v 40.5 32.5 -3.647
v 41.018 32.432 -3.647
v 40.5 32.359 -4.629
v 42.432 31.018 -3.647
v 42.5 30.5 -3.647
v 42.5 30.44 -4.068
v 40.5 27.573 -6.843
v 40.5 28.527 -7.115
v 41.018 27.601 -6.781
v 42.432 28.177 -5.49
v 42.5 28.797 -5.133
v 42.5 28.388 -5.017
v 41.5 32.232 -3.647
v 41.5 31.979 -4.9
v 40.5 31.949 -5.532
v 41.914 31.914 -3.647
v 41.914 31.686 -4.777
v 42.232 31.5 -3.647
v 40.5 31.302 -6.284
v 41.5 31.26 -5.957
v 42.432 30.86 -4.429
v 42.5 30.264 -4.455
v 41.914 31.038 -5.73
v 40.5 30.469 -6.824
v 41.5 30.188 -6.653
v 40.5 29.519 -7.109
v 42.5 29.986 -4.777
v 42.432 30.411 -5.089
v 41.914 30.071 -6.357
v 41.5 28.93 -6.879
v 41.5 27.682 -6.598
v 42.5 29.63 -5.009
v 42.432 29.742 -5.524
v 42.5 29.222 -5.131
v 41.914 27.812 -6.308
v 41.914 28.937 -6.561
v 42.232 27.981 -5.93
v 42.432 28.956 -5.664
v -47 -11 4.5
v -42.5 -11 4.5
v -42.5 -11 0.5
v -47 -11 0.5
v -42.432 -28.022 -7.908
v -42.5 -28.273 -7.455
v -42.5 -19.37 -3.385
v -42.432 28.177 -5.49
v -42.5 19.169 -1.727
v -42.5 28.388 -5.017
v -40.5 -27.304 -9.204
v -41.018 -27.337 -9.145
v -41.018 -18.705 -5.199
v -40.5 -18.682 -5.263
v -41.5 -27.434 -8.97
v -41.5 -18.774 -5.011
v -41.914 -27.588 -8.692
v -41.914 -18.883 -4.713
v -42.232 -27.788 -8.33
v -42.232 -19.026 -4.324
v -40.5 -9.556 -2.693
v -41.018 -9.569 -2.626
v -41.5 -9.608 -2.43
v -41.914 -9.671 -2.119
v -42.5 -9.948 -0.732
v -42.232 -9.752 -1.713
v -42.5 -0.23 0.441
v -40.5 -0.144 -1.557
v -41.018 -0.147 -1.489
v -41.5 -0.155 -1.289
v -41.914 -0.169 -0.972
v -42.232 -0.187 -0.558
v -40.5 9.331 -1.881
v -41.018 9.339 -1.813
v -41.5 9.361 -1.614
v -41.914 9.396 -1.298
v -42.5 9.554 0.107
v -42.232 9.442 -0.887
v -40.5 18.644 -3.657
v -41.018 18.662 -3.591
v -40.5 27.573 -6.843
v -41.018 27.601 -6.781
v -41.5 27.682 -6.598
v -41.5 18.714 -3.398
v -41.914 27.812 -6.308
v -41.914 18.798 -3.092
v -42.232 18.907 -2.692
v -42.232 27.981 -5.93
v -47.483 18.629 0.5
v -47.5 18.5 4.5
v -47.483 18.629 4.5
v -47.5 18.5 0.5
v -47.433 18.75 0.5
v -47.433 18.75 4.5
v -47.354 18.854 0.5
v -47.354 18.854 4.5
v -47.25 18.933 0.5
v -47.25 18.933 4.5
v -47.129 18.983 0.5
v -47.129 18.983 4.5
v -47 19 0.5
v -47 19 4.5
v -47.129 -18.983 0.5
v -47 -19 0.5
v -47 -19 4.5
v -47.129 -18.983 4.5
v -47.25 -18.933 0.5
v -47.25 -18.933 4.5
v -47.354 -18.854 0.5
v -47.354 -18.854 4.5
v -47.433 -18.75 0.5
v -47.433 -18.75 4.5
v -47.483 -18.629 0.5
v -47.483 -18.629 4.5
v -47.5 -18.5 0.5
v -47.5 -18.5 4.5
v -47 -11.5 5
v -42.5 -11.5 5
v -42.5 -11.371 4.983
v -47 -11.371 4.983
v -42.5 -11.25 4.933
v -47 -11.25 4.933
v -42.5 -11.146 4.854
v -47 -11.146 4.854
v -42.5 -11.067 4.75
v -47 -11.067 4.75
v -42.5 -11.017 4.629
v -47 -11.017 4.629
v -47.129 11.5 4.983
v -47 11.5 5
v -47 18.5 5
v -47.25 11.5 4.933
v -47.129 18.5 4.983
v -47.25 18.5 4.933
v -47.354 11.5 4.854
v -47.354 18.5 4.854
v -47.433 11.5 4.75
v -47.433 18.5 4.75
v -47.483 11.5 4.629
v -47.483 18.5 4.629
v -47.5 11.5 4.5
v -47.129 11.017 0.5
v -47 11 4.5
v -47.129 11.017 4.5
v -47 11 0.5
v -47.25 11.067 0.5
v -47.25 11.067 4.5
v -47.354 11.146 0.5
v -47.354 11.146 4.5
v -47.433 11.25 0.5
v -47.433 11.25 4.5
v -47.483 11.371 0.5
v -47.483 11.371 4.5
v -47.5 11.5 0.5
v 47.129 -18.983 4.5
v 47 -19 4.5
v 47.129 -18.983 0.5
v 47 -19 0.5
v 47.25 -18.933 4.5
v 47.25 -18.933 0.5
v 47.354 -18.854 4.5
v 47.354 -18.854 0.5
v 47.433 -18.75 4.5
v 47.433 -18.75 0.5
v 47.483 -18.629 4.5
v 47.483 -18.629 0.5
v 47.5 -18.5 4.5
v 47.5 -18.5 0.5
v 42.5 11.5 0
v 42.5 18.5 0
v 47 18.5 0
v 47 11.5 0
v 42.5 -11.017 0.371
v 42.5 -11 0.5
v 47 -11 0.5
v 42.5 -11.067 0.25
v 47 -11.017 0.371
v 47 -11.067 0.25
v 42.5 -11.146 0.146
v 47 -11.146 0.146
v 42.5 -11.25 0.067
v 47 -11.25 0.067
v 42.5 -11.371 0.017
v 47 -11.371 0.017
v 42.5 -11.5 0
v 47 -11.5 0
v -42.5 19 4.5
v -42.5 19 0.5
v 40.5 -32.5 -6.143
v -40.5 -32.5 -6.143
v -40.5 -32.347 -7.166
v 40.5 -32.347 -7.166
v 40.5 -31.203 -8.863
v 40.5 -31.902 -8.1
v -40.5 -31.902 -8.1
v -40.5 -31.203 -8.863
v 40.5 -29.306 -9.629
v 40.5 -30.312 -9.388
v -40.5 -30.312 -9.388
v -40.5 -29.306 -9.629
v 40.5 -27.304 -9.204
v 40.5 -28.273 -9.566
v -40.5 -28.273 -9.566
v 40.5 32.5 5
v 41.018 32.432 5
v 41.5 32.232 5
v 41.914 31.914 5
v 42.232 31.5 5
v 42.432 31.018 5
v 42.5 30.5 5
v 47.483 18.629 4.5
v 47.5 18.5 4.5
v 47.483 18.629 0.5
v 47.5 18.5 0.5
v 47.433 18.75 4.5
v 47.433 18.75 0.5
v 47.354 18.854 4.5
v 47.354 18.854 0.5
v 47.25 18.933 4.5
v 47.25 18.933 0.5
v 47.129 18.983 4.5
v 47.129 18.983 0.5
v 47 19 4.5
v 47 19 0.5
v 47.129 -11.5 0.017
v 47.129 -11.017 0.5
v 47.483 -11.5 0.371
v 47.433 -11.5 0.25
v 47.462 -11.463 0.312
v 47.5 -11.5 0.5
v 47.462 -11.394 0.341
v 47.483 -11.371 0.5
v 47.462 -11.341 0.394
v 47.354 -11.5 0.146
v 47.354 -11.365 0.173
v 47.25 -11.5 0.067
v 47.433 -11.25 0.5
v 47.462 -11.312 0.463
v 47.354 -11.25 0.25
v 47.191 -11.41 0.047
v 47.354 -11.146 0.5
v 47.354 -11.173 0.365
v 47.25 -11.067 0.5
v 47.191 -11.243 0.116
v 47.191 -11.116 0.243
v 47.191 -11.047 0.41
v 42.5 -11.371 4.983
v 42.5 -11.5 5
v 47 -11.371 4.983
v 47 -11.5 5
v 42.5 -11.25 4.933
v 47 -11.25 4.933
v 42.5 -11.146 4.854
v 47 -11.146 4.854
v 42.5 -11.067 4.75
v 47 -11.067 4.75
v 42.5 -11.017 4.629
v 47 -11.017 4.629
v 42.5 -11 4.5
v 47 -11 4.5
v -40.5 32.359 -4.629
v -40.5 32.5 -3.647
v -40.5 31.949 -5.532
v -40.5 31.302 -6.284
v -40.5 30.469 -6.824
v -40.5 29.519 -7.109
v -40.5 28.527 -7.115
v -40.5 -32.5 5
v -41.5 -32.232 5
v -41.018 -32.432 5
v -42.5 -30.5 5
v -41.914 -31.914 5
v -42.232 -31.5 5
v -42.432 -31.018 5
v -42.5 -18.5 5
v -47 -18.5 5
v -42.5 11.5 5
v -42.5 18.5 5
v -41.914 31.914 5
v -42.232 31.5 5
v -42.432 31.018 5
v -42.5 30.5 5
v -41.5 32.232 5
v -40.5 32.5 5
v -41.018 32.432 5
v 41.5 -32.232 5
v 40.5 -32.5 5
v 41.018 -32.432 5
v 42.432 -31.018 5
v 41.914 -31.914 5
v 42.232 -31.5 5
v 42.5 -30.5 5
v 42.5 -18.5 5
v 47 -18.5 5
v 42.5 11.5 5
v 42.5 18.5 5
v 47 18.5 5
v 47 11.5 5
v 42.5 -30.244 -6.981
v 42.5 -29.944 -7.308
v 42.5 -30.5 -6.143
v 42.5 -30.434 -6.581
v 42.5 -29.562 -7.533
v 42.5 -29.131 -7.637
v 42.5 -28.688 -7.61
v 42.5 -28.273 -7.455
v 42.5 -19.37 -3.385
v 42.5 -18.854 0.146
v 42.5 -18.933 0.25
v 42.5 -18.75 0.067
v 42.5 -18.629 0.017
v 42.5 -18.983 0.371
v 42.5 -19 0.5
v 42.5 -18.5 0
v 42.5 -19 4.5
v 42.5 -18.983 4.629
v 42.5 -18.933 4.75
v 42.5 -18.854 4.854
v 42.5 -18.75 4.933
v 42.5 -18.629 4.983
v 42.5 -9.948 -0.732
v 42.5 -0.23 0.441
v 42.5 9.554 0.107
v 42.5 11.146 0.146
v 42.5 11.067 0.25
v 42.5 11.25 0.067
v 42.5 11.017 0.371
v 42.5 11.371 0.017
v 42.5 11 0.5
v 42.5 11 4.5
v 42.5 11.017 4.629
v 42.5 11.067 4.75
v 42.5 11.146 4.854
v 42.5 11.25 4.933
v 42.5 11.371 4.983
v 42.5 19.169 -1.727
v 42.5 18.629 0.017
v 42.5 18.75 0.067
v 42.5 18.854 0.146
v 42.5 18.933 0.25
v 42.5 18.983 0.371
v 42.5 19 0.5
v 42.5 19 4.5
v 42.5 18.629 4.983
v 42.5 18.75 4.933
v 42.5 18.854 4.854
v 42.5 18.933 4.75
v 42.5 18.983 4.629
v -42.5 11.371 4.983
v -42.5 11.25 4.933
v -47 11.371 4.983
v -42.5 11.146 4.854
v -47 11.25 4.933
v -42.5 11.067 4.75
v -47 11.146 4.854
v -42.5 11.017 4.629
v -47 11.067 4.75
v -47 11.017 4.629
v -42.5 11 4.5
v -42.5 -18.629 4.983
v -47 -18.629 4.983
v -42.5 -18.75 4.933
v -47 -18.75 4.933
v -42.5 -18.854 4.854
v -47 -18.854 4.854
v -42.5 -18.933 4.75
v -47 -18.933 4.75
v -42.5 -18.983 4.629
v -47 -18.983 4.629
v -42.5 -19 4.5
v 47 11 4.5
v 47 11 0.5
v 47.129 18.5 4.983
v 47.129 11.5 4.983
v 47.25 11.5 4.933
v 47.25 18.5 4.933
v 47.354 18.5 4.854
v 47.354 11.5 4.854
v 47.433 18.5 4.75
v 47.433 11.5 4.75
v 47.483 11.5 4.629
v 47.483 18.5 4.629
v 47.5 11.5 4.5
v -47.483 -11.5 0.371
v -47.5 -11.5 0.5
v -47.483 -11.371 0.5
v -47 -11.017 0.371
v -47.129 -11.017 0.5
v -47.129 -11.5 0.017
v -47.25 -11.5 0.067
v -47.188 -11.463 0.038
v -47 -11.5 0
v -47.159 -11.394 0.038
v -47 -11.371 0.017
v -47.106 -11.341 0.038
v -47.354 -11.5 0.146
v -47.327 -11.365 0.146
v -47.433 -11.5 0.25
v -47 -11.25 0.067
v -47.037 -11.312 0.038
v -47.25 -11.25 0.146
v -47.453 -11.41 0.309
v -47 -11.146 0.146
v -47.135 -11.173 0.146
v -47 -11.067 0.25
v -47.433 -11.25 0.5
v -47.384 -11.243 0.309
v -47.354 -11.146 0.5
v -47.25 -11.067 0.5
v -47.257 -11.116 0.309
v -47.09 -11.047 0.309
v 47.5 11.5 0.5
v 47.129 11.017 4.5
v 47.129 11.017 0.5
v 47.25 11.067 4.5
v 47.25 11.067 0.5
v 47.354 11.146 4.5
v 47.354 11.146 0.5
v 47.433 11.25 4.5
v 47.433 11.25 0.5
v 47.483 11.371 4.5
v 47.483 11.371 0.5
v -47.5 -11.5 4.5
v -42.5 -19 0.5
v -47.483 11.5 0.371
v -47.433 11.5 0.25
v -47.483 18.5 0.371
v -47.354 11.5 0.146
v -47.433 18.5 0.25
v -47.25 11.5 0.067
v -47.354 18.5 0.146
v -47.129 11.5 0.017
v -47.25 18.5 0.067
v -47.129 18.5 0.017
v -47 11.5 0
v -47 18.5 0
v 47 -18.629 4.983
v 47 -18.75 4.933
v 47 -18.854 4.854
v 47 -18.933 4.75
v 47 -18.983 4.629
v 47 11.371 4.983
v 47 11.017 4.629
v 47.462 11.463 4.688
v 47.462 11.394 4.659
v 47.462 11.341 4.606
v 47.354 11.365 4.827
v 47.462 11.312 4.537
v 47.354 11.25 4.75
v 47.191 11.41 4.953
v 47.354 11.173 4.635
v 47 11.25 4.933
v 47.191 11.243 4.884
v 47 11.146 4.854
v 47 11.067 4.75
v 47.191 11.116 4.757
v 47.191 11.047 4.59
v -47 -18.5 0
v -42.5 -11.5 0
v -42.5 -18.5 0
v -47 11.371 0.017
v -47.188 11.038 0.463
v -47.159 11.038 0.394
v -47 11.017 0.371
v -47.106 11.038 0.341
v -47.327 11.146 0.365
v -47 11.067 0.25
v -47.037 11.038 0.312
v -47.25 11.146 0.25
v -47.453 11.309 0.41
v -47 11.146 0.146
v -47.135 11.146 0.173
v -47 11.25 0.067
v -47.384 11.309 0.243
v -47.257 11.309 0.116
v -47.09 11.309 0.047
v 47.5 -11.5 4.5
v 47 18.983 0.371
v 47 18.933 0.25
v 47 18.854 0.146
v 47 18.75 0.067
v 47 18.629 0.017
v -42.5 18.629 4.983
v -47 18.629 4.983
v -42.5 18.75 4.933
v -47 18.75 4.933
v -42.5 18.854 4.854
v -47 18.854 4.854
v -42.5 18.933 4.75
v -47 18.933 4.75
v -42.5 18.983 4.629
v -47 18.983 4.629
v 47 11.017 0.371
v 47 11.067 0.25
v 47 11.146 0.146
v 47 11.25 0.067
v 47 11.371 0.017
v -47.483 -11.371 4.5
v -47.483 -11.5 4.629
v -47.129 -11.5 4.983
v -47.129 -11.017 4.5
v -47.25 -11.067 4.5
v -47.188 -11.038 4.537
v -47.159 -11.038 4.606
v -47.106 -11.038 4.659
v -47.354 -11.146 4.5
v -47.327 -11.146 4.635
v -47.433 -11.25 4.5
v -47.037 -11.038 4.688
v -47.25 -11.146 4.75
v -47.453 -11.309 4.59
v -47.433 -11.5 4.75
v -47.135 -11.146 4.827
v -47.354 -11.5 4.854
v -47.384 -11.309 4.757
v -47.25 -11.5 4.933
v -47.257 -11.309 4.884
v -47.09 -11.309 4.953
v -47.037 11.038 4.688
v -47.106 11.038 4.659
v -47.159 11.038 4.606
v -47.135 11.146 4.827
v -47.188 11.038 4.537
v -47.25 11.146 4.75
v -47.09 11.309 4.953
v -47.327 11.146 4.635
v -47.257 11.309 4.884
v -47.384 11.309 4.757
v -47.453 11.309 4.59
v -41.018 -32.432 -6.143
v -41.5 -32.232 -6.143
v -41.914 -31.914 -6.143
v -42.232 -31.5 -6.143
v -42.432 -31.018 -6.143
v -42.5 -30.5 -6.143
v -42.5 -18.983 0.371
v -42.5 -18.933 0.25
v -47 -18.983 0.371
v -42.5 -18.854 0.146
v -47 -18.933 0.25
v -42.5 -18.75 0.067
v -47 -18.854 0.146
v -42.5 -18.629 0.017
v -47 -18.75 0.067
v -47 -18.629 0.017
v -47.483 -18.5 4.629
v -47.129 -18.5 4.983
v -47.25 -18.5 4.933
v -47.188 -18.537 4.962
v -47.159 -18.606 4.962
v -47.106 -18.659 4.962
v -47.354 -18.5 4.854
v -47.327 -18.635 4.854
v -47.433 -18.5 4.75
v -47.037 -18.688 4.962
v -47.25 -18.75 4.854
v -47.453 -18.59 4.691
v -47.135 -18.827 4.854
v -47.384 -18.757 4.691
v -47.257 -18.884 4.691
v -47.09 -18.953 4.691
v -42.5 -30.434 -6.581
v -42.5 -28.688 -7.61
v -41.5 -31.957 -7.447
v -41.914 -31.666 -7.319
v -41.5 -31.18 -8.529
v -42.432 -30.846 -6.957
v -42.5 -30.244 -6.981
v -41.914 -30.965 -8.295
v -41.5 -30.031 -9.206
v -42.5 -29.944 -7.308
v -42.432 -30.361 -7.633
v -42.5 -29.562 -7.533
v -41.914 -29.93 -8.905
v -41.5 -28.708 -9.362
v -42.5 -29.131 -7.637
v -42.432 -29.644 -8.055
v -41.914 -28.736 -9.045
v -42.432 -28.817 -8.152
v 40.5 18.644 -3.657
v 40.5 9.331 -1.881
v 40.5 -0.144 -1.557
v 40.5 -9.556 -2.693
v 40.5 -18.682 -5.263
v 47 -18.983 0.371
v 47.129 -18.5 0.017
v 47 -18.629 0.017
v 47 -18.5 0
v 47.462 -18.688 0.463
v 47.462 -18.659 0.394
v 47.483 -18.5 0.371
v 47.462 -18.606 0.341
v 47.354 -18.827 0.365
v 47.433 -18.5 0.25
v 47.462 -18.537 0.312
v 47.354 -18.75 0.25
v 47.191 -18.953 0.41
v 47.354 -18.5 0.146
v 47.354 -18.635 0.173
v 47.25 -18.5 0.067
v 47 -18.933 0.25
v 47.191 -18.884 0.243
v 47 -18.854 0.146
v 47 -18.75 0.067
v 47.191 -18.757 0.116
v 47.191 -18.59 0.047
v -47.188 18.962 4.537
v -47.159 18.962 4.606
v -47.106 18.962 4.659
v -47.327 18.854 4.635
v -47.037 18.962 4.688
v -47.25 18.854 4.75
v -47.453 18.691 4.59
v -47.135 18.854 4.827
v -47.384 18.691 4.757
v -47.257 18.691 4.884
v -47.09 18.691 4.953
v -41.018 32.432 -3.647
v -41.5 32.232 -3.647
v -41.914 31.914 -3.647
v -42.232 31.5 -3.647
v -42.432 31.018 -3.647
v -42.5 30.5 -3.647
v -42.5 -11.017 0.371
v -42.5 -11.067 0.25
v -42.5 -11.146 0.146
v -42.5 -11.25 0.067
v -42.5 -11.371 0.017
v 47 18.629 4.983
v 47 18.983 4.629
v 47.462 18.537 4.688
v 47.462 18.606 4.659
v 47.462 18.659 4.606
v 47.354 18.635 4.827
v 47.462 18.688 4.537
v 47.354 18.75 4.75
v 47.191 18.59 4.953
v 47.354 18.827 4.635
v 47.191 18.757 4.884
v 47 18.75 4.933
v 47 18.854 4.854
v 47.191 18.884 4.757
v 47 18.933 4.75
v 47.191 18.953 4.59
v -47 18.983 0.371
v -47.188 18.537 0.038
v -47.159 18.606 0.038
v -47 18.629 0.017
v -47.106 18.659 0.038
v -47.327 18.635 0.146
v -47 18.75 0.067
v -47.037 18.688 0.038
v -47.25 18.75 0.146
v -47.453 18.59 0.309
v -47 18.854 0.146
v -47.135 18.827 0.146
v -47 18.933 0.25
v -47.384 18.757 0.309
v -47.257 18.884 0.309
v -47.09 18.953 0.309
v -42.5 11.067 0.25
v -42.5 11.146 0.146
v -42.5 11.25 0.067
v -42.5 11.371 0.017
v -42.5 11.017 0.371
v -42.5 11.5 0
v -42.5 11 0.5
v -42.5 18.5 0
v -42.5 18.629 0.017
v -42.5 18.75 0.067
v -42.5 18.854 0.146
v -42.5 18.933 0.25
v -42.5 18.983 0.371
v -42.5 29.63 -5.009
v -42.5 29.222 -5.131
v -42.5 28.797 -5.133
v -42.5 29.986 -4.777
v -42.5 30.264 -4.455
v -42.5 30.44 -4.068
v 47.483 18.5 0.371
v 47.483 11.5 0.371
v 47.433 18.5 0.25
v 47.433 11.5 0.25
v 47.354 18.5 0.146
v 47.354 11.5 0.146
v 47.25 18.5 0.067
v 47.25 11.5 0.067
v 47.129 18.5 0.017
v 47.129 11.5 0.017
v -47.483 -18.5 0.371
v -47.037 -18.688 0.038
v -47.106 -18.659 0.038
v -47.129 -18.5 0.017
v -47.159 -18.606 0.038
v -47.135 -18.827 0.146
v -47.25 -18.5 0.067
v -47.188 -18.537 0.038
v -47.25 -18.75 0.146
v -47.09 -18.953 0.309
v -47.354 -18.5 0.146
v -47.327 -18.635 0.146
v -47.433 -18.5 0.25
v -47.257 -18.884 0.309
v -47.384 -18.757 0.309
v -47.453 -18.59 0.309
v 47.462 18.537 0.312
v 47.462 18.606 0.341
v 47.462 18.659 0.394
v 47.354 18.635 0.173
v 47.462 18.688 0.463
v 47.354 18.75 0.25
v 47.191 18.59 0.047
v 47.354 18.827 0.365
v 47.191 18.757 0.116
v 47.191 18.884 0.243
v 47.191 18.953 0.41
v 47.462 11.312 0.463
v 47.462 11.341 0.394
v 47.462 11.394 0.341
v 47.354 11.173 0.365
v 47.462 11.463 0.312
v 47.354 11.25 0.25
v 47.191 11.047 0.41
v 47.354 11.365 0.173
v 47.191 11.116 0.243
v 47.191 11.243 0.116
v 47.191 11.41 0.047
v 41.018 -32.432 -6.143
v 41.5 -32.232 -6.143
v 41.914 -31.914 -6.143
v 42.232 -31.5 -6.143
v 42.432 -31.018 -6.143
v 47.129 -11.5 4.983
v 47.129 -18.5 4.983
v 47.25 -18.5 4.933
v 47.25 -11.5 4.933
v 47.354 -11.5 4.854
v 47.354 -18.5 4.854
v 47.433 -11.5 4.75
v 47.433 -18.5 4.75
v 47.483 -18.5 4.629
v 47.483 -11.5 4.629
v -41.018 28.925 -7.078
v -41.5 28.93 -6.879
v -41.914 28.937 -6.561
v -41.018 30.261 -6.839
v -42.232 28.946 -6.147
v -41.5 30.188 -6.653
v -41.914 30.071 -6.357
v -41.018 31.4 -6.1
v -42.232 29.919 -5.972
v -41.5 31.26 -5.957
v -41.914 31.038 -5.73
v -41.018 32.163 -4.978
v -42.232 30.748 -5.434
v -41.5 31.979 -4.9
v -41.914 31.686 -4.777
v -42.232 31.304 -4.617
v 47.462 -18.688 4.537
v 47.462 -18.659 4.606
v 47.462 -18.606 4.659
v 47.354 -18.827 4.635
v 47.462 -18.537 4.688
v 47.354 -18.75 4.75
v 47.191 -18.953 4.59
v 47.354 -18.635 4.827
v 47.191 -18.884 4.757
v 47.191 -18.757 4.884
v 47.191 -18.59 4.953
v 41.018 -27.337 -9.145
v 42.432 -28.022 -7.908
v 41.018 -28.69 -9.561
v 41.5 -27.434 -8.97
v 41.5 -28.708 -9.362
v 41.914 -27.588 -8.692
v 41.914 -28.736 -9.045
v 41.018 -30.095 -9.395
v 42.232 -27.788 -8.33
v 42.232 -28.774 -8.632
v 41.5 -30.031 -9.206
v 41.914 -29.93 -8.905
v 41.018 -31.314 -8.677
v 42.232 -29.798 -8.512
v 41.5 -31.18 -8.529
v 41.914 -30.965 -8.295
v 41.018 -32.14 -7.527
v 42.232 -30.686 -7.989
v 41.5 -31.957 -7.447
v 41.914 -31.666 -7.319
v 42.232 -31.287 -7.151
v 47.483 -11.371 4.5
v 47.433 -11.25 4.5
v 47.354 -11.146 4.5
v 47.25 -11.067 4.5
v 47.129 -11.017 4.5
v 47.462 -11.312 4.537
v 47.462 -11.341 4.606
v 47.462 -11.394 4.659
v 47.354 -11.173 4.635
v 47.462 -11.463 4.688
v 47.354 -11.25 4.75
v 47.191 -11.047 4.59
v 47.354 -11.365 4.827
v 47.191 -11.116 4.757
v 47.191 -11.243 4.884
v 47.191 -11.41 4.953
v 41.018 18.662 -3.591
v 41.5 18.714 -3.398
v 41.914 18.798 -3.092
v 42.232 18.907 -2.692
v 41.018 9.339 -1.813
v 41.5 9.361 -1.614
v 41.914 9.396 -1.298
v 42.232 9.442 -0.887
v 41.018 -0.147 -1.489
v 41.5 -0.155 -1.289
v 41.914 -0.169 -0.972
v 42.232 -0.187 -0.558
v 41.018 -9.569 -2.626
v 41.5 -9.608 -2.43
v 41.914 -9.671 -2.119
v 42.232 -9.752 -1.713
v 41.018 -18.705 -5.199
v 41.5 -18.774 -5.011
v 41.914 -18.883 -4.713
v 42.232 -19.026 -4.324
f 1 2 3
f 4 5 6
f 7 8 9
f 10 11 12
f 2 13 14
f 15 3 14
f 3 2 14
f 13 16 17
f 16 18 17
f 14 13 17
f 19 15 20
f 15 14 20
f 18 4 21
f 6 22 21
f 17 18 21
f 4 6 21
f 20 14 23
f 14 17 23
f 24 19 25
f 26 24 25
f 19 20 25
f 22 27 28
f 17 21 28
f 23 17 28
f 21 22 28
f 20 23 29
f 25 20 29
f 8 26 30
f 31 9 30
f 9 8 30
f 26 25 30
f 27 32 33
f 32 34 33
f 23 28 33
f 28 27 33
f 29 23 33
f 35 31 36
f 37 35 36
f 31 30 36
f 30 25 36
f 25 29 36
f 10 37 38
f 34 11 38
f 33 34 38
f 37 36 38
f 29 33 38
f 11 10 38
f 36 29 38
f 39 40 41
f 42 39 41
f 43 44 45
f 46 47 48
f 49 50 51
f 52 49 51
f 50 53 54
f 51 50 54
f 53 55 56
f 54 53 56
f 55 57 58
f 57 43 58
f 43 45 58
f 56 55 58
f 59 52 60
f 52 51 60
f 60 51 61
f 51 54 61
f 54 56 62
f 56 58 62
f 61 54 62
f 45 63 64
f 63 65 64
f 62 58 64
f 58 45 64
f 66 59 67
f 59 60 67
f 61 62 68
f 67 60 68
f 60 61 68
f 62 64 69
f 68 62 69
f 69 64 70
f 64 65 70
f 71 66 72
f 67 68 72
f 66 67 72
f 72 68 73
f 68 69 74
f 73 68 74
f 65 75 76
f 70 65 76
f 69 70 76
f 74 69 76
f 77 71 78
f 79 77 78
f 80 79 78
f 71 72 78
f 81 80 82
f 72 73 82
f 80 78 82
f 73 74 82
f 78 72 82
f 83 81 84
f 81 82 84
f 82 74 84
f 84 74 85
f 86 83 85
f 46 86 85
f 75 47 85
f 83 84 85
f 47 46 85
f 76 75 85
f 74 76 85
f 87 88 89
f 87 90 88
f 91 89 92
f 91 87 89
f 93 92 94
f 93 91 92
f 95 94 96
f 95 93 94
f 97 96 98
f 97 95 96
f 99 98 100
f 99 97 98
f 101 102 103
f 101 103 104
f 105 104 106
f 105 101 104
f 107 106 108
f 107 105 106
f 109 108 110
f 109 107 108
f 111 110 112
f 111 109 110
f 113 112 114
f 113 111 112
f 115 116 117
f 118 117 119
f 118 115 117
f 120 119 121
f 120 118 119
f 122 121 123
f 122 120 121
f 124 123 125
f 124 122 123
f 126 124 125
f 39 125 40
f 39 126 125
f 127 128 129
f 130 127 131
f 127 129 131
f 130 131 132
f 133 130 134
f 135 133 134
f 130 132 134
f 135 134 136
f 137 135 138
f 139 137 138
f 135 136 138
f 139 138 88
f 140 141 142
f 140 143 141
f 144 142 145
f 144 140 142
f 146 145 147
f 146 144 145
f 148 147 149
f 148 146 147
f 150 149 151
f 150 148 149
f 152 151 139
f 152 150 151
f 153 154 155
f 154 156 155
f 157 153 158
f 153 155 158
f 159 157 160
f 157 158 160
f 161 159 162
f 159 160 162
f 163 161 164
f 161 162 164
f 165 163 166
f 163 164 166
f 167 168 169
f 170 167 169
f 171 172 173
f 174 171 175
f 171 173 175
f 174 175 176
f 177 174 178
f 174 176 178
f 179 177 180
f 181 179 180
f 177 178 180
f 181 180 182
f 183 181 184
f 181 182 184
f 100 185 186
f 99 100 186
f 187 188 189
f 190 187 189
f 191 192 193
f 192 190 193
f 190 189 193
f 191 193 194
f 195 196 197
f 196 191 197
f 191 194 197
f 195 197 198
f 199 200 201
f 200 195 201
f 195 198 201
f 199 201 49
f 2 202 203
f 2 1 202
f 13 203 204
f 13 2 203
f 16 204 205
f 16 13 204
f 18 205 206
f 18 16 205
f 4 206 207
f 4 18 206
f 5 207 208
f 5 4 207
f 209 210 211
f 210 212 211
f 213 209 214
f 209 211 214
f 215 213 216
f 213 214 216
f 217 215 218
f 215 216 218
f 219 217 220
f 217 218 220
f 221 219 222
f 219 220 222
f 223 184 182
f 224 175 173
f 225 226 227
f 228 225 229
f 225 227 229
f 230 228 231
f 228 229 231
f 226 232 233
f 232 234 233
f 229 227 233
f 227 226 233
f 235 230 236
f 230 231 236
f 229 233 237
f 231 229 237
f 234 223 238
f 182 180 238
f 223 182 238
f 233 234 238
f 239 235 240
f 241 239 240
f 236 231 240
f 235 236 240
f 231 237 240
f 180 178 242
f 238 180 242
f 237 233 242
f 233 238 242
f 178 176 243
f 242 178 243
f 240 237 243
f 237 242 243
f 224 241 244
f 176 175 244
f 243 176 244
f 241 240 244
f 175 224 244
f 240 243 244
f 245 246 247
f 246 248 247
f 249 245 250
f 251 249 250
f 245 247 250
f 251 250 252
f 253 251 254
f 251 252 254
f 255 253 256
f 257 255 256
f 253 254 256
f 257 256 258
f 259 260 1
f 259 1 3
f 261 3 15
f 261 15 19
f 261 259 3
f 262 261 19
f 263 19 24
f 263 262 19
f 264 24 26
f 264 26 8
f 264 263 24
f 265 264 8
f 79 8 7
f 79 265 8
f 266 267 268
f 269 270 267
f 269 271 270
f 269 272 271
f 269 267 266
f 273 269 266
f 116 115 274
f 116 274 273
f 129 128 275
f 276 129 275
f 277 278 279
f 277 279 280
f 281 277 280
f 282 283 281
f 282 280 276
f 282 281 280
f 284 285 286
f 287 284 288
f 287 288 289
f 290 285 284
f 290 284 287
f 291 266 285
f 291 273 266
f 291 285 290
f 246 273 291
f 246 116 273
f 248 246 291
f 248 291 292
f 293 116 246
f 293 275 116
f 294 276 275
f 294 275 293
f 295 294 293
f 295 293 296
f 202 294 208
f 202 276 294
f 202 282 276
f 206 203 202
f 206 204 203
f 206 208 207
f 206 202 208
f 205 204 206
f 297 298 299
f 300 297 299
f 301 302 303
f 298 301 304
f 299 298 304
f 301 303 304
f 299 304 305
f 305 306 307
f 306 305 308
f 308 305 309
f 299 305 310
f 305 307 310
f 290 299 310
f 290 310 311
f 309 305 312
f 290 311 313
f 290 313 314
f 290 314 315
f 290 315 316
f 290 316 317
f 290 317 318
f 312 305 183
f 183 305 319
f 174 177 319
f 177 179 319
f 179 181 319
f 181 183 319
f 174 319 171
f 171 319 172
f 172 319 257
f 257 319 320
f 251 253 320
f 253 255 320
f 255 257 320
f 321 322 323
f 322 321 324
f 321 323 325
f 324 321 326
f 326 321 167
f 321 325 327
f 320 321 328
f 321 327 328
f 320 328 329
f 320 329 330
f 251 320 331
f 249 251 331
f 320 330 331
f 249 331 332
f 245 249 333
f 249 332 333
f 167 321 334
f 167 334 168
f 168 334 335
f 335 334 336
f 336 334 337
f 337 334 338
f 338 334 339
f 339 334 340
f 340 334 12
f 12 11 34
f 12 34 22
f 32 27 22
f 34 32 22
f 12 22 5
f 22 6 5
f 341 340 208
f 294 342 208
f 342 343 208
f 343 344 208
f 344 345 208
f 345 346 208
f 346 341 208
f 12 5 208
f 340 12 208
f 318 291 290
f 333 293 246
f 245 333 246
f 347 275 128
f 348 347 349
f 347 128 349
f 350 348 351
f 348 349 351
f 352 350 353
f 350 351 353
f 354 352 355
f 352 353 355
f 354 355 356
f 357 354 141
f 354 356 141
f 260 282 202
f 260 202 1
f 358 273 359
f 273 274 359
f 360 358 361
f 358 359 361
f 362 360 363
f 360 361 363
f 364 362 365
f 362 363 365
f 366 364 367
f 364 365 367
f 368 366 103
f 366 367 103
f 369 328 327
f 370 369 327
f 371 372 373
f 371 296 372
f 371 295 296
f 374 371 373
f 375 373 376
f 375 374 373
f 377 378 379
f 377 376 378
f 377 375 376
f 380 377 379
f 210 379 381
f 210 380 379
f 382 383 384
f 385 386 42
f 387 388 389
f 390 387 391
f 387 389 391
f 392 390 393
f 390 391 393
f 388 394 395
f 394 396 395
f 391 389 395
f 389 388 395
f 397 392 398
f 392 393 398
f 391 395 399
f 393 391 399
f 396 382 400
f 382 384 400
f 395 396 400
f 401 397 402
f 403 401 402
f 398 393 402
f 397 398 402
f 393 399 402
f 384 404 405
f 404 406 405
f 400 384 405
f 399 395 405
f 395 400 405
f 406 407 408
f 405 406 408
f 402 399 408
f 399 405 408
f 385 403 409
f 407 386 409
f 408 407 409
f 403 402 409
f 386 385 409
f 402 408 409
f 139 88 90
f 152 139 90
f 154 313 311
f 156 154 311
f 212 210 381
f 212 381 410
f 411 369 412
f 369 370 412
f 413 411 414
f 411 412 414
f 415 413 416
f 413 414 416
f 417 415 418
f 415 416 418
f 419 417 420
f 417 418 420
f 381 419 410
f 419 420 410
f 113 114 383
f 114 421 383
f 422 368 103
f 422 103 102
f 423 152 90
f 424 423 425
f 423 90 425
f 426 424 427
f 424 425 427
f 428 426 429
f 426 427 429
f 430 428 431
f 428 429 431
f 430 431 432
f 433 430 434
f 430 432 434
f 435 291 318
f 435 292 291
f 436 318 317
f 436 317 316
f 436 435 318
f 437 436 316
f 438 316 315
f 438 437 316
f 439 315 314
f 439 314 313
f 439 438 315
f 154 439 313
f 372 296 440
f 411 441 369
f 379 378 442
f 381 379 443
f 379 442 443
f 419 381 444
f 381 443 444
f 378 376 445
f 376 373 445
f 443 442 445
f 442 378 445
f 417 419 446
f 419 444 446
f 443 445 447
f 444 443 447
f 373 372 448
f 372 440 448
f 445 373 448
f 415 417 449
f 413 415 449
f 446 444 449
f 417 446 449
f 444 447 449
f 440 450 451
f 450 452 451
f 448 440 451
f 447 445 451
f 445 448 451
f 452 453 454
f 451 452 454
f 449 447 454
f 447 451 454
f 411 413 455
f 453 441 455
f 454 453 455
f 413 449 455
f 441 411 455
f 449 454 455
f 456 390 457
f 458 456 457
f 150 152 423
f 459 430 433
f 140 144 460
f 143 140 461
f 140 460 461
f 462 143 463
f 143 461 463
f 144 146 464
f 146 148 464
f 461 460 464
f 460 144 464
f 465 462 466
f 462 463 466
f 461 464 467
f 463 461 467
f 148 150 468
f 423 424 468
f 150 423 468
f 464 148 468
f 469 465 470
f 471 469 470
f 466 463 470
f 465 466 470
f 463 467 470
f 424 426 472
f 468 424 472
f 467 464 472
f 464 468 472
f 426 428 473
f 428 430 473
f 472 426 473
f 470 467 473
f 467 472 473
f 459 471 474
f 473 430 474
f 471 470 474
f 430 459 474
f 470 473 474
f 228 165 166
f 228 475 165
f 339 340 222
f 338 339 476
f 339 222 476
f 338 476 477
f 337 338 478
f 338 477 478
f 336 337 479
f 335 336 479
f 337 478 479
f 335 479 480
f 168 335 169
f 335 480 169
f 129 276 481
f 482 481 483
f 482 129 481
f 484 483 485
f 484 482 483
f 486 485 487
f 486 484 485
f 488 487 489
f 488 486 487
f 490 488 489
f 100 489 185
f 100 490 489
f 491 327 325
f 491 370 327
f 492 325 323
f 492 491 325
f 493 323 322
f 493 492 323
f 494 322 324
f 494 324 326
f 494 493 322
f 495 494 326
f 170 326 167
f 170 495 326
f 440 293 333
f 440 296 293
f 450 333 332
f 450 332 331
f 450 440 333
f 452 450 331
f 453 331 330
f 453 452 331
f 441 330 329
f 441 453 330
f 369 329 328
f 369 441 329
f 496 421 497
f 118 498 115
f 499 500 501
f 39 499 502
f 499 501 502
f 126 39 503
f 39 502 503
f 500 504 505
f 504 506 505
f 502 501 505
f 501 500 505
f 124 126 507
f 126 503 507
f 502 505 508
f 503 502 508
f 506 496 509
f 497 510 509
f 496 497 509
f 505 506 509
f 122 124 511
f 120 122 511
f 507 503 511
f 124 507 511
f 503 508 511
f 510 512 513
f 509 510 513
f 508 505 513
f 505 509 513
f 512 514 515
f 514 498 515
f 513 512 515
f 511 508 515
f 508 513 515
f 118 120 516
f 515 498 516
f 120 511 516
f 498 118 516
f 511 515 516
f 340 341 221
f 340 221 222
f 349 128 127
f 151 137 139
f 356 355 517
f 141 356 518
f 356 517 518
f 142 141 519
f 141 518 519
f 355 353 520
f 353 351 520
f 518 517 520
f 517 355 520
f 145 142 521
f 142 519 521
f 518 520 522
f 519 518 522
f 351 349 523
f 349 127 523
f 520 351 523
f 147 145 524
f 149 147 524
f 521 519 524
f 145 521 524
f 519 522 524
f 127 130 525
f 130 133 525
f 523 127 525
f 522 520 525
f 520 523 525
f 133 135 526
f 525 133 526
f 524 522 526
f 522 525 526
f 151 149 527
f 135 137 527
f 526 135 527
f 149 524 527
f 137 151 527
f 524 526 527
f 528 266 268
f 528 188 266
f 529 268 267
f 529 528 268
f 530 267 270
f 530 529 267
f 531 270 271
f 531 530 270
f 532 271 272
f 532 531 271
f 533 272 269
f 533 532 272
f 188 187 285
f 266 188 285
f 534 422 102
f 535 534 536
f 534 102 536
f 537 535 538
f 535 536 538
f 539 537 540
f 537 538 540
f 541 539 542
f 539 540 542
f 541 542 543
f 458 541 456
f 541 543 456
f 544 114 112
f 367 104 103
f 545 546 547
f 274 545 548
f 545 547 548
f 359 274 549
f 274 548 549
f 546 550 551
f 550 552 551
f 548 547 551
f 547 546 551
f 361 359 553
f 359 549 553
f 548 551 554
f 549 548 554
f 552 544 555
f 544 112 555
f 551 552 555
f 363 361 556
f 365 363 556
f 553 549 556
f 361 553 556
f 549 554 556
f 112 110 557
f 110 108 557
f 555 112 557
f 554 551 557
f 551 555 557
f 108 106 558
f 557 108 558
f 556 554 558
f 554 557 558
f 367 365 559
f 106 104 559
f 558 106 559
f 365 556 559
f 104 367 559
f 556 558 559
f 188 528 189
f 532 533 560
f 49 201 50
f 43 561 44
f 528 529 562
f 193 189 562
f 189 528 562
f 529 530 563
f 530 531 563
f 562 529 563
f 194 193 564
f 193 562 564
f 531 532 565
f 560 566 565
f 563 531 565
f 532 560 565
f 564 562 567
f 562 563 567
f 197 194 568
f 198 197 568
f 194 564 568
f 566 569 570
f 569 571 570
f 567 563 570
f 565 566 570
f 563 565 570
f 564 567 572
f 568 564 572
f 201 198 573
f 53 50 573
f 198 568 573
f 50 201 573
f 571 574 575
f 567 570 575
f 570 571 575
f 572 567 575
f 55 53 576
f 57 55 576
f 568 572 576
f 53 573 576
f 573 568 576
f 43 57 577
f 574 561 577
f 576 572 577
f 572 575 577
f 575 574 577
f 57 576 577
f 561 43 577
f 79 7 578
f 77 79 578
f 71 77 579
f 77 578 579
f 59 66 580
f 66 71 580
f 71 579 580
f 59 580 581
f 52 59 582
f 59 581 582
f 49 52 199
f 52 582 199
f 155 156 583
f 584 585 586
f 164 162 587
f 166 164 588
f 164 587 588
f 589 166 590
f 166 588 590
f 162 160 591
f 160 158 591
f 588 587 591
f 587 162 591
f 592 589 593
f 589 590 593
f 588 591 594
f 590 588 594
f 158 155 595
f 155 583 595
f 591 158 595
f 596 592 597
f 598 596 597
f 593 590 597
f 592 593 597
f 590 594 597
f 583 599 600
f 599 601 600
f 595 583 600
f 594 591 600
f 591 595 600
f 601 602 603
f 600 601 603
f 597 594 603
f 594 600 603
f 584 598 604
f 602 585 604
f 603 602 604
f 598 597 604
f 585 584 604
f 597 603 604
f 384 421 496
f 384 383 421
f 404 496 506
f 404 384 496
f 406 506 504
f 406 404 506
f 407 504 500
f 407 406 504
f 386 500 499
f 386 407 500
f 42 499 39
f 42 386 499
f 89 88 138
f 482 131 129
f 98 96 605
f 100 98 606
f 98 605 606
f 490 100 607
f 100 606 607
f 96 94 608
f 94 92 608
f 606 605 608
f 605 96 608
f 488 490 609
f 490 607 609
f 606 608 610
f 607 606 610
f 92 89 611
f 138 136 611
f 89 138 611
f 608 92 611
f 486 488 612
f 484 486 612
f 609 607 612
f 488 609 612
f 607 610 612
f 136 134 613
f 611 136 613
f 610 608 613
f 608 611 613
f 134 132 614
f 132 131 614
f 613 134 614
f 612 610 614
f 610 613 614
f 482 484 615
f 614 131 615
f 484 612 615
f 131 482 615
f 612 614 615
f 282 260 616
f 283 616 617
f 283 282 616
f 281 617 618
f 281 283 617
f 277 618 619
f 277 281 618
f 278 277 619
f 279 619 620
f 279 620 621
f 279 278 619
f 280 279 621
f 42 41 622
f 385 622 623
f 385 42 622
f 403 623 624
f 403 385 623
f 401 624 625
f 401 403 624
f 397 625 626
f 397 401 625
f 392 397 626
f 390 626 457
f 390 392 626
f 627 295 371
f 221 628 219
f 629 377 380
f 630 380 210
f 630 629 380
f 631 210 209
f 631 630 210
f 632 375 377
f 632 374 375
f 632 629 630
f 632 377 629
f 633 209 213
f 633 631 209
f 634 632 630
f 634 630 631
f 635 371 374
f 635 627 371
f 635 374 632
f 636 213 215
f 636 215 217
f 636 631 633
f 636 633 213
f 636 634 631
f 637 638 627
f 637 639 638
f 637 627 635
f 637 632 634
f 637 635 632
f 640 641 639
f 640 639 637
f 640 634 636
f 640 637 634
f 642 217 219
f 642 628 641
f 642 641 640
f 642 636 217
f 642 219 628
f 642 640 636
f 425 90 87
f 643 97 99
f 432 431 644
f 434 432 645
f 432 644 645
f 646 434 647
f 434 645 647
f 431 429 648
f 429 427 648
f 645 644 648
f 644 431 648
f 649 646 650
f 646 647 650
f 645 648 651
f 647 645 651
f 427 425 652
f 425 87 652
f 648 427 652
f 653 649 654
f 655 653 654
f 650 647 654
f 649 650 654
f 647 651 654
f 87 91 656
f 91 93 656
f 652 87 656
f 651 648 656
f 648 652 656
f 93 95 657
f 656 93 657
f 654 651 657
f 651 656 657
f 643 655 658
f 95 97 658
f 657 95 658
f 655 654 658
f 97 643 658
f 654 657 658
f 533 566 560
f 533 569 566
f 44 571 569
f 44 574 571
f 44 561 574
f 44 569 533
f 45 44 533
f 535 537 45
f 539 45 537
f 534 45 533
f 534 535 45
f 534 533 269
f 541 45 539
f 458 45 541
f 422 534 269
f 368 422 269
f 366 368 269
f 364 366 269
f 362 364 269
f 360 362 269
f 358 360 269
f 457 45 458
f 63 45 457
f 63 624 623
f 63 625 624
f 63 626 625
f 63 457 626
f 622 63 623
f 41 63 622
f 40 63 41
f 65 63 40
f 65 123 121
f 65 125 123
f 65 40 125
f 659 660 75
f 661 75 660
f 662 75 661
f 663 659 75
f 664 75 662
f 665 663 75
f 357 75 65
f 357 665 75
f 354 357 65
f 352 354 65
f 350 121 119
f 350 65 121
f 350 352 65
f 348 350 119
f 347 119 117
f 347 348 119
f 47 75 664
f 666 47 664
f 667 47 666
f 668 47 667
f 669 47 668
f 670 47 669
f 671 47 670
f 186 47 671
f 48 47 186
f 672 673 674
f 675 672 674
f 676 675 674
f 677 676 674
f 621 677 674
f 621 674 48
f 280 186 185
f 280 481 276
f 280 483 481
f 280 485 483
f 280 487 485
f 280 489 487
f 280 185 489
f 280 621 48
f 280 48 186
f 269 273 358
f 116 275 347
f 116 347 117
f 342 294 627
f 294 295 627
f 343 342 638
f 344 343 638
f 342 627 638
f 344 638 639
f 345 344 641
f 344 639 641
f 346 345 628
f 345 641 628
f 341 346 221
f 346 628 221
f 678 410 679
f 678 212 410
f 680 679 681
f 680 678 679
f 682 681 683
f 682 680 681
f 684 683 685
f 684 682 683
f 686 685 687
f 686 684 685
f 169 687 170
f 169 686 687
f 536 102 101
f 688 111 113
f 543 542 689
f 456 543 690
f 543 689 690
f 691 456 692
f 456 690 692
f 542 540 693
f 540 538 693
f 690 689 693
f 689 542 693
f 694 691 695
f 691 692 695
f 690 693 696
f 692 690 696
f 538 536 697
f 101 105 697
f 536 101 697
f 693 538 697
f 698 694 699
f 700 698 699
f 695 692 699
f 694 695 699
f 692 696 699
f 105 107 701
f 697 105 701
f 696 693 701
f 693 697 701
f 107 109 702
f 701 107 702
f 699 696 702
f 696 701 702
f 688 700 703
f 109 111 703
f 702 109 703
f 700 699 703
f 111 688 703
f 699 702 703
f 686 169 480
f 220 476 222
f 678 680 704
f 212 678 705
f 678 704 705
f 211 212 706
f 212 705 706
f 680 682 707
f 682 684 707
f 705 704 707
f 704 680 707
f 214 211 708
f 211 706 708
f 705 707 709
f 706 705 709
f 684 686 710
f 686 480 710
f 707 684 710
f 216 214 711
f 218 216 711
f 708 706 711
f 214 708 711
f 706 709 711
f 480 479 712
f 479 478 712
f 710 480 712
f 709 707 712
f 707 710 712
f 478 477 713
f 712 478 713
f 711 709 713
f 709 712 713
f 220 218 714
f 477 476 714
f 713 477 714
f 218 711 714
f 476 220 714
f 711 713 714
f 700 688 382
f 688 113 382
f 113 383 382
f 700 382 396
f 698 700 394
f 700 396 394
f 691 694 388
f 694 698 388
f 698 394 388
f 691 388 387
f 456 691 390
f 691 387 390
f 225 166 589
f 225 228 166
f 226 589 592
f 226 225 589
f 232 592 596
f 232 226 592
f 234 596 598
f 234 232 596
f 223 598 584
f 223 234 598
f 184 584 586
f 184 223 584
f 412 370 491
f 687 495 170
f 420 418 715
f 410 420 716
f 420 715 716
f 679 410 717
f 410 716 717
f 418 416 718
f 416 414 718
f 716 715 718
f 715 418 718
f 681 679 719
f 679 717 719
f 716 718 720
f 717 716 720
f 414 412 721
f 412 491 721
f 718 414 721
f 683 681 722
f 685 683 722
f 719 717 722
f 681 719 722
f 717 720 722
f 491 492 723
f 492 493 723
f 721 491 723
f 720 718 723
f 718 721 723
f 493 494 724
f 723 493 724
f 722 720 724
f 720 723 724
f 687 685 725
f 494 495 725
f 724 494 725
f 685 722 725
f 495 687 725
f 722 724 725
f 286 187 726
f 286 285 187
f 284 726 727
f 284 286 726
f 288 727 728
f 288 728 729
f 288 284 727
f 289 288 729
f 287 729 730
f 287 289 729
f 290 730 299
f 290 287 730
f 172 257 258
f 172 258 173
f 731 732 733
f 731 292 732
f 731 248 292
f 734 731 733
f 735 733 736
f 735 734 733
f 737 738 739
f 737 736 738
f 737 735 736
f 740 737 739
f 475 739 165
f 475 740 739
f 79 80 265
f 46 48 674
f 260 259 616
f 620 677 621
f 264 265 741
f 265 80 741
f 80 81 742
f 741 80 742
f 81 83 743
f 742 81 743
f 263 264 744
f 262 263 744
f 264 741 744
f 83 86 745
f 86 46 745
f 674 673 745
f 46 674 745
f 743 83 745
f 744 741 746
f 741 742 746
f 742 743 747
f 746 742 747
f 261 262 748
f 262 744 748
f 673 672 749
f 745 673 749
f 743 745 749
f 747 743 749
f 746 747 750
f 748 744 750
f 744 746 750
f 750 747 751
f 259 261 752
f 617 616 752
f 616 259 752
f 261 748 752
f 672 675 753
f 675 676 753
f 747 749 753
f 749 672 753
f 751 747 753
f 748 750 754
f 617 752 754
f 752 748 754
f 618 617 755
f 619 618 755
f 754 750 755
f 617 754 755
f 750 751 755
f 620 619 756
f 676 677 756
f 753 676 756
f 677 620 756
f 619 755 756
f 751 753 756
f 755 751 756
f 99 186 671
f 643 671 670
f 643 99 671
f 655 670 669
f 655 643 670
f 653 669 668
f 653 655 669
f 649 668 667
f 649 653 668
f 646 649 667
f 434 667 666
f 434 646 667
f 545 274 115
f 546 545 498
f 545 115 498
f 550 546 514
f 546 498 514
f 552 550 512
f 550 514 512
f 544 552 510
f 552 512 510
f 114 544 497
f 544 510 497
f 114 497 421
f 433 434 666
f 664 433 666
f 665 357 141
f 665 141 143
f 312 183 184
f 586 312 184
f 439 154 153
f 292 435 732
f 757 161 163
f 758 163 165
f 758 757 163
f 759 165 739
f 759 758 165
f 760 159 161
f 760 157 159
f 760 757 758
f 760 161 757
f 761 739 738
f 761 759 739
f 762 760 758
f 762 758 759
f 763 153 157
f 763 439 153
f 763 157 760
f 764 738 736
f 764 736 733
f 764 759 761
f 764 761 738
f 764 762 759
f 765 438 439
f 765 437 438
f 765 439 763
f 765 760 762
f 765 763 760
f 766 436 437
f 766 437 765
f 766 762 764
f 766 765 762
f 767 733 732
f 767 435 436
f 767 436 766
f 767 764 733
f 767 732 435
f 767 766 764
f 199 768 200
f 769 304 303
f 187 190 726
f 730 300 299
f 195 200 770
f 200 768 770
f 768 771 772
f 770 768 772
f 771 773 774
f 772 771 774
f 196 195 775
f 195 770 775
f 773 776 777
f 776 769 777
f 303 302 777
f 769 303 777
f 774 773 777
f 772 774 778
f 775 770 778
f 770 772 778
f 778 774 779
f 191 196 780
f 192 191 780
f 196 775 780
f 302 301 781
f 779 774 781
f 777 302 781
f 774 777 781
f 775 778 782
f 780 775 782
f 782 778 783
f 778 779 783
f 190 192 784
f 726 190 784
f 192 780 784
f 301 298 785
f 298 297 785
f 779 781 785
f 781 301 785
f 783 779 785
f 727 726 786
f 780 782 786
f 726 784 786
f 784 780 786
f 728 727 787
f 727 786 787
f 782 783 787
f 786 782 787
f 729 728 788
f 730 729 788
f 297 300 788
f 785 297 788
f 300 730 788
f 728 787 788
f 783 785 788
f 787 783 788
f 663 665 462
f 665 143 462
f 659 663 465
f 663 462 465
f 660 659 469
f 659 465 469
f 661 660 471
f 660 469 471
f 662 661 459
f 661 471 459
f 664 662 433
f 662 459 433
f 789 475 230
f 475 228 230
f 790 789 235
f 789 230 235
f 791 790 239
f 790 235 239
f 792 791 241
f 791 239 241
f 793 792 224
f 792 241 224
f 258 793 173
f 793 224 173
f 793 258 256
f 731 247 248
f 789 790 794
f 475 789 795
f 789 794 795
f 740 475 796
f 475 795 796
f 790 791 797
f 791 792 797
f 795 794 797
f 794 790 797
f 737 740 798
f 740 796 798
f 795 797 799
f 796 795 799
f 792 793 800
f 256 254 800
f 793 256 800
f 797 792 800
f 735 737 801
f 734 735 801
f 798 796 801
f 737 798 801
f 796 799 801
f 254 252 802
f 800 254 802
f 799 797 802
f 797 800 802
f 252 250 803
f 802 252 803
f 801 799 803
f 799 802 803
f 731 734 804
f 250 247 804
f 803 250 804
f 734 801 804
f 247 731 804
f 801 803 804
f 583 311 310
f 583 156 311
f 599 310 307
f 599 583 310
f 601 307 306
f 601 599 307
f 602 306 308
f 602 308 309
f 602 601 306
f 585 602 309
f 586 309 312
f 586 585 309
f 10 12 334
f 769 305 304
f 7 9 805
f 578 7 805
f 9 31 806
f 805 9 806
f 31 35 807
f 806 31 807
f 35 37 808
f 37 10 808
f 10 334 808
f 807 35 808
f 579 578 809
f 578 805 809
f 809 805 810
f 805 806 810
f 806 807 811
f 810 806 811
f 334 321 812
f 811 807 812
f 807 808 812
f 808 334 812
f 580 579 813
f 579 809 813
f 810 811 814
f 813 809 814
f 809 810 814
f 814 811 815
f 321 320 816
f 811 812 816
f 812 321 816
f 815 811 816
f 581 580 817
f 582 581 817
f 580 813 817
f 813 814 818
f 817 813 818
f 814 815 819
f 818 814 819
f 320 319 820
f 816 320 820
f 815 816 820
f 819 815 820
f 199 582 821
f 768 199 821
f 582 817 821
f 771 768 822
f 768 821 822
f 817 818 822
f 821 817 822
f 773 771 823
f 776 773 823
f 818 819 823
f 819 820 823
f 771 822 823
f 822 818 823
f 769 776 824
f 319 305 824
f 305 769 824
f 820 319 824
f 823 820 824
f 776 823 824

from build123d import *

# Parameters (mm, degrees)
CROQUIS1_W              = 85
CROQUIS1_H              = 65
SALIENTE_EXTRUIR1_DEPTH = 5
CROQUIS3_W              = 5
CROQUIS3_H              = 8
SALIENTE_EXTRUIR3_DEPTH = 5
SALIENTE_EXTRUIR2_DEPTH = 85
REDONDEO1_R             = 3.5
REDONDEO2_R             = 2
REDONDEO3_R             = 0.5


with BuildPart() as part:
    # Croquis1 → Saliente-Extruir1 (new body)
    with BuildSketch(Plane.XY):
        Rectangle(CROQUIS1_W, CROQUIS1_H)
    extrude(amount=SALIENTE_EXTRUIR1_DEPTH)

    # Croquis3 → Saliente-Extruir3 (add)
    with BuildSketch(Plane(origin=(42.5, 0, 0), x_dir=(0, 0, -1), z_dir=(1, 0, 0))):
        with Locations((-2.5, 15)):
            Rectangle(CROQUIS3_W, CROQUIS3_H)
        with Locations((-2.5, -15)):
            Rectangle(CROQUIS3_W, CROQUIS3_H)
    saliente_extruir3 = extrude(amount=SALIENTE_EXTRUIR3_DEPTH)

    # Simetría1: Saliente-Extruir3 across plane
    add(saliente_extruir3.mirror(Plane(origin=(0, 0, 0), x_dir=(0, 0, 1), z_dir=(1, 0, 0))))

    # Croquis2 → Saliente-Extruir2 (add)
    with BuildSketch(Plane(origin=(42.5, 0, 0), x_dir=(0, 0, -1), z_dir=(1, 0, 0))):
        with BuildLine():
            Line((0, 32.5), (9.313409495, 32.5))
            ThreePointArc((9.313409495, 32.5), (1.570605068, -0.446088635), (12.430740563, -32.5))
            Line((12.430740563, -32.5), (0, -32.5))
            Line((0, -32.5), (0, 32.5))
        make_face()
    extrude(amount=-SALIENTE_EXTRUIR2_DEPTH)

    # Redondeo1
    redondeo1_edges = [part.edges().sort_by_distance(p)[0] for p in [
        (0, 32.5, -9.313409495),
        (0, -32.5, -12.430740563),
    ]]
    fillet(redondeo1_edges, radius=REDONDEO1_R)

    # Redondeo2
    redondeo2_edges = [part.edges().sort_by_distance(p)[0] for p in [
        (-42.5, 32.5, 0.676379496),
        (42.5, 32.5, 0.676379496),
        (42.5, -32.5, -0.571361271),
        (-42.5, -32.5, -0.571361271),
        (42.5, -0.143625132, -1.556845408),
        (42.5, 30.904700663, -6.583584888),
        (42.5, -30.776719103, -9.158227347),
        (-42.5, -0.143625132, -1.556845408),
        (-42.5, 30.904700663, -6.583584888),
        (-42.5, -30.776719103, -9.158227347),
    ]]
    fillet(redondeo2_edges, radius=REDONDEO2_R)

    # Redondeo3
    redondeo3_edges = [part.edges().sort_by_distance(p)[0] for p in [
        (45, 19, 5),
        (45, 11, 5),
        (45, 11, 0),
        (45, 19, 0),
        (47.5, 15, 5),
        (47.5, 11, 2.5),
        (47.5, 15, 0),
        (47.5, 19, 2.5),
        (45, -19, 5),
        (45, -19, 0),
        (45, -11, 0),
        (45, -11, 5),
        (47.5, -19, 2.5),
        (47.5, -15, 0),
        (47.5, -11, 2.5),
        (47.5, -15, 5),
        (-47.5, 15, 5),
        (-45, 11, 5),
        (-47.5, 19, 2.5),
        (-45, 19, 5),
        (-47.5, 15, 0),
        (-45, 19, 0),
        (-47.5, 11, 2.5),
        (-45, 11, 0),
        (-47.5, -19, 2.5),
        (-45, -19, 0),
        (-47.5, -15, 5),
        (-45, -19, 5),
        (-47.5, -11, 2.5),
        (-45, -11, 5),
        (-47.5, -15, 0),
        (-45, -11, 0),
    ]]
    fillet(redondeo3_edges, radius=REDONDEO3_R)


solid = part.part
